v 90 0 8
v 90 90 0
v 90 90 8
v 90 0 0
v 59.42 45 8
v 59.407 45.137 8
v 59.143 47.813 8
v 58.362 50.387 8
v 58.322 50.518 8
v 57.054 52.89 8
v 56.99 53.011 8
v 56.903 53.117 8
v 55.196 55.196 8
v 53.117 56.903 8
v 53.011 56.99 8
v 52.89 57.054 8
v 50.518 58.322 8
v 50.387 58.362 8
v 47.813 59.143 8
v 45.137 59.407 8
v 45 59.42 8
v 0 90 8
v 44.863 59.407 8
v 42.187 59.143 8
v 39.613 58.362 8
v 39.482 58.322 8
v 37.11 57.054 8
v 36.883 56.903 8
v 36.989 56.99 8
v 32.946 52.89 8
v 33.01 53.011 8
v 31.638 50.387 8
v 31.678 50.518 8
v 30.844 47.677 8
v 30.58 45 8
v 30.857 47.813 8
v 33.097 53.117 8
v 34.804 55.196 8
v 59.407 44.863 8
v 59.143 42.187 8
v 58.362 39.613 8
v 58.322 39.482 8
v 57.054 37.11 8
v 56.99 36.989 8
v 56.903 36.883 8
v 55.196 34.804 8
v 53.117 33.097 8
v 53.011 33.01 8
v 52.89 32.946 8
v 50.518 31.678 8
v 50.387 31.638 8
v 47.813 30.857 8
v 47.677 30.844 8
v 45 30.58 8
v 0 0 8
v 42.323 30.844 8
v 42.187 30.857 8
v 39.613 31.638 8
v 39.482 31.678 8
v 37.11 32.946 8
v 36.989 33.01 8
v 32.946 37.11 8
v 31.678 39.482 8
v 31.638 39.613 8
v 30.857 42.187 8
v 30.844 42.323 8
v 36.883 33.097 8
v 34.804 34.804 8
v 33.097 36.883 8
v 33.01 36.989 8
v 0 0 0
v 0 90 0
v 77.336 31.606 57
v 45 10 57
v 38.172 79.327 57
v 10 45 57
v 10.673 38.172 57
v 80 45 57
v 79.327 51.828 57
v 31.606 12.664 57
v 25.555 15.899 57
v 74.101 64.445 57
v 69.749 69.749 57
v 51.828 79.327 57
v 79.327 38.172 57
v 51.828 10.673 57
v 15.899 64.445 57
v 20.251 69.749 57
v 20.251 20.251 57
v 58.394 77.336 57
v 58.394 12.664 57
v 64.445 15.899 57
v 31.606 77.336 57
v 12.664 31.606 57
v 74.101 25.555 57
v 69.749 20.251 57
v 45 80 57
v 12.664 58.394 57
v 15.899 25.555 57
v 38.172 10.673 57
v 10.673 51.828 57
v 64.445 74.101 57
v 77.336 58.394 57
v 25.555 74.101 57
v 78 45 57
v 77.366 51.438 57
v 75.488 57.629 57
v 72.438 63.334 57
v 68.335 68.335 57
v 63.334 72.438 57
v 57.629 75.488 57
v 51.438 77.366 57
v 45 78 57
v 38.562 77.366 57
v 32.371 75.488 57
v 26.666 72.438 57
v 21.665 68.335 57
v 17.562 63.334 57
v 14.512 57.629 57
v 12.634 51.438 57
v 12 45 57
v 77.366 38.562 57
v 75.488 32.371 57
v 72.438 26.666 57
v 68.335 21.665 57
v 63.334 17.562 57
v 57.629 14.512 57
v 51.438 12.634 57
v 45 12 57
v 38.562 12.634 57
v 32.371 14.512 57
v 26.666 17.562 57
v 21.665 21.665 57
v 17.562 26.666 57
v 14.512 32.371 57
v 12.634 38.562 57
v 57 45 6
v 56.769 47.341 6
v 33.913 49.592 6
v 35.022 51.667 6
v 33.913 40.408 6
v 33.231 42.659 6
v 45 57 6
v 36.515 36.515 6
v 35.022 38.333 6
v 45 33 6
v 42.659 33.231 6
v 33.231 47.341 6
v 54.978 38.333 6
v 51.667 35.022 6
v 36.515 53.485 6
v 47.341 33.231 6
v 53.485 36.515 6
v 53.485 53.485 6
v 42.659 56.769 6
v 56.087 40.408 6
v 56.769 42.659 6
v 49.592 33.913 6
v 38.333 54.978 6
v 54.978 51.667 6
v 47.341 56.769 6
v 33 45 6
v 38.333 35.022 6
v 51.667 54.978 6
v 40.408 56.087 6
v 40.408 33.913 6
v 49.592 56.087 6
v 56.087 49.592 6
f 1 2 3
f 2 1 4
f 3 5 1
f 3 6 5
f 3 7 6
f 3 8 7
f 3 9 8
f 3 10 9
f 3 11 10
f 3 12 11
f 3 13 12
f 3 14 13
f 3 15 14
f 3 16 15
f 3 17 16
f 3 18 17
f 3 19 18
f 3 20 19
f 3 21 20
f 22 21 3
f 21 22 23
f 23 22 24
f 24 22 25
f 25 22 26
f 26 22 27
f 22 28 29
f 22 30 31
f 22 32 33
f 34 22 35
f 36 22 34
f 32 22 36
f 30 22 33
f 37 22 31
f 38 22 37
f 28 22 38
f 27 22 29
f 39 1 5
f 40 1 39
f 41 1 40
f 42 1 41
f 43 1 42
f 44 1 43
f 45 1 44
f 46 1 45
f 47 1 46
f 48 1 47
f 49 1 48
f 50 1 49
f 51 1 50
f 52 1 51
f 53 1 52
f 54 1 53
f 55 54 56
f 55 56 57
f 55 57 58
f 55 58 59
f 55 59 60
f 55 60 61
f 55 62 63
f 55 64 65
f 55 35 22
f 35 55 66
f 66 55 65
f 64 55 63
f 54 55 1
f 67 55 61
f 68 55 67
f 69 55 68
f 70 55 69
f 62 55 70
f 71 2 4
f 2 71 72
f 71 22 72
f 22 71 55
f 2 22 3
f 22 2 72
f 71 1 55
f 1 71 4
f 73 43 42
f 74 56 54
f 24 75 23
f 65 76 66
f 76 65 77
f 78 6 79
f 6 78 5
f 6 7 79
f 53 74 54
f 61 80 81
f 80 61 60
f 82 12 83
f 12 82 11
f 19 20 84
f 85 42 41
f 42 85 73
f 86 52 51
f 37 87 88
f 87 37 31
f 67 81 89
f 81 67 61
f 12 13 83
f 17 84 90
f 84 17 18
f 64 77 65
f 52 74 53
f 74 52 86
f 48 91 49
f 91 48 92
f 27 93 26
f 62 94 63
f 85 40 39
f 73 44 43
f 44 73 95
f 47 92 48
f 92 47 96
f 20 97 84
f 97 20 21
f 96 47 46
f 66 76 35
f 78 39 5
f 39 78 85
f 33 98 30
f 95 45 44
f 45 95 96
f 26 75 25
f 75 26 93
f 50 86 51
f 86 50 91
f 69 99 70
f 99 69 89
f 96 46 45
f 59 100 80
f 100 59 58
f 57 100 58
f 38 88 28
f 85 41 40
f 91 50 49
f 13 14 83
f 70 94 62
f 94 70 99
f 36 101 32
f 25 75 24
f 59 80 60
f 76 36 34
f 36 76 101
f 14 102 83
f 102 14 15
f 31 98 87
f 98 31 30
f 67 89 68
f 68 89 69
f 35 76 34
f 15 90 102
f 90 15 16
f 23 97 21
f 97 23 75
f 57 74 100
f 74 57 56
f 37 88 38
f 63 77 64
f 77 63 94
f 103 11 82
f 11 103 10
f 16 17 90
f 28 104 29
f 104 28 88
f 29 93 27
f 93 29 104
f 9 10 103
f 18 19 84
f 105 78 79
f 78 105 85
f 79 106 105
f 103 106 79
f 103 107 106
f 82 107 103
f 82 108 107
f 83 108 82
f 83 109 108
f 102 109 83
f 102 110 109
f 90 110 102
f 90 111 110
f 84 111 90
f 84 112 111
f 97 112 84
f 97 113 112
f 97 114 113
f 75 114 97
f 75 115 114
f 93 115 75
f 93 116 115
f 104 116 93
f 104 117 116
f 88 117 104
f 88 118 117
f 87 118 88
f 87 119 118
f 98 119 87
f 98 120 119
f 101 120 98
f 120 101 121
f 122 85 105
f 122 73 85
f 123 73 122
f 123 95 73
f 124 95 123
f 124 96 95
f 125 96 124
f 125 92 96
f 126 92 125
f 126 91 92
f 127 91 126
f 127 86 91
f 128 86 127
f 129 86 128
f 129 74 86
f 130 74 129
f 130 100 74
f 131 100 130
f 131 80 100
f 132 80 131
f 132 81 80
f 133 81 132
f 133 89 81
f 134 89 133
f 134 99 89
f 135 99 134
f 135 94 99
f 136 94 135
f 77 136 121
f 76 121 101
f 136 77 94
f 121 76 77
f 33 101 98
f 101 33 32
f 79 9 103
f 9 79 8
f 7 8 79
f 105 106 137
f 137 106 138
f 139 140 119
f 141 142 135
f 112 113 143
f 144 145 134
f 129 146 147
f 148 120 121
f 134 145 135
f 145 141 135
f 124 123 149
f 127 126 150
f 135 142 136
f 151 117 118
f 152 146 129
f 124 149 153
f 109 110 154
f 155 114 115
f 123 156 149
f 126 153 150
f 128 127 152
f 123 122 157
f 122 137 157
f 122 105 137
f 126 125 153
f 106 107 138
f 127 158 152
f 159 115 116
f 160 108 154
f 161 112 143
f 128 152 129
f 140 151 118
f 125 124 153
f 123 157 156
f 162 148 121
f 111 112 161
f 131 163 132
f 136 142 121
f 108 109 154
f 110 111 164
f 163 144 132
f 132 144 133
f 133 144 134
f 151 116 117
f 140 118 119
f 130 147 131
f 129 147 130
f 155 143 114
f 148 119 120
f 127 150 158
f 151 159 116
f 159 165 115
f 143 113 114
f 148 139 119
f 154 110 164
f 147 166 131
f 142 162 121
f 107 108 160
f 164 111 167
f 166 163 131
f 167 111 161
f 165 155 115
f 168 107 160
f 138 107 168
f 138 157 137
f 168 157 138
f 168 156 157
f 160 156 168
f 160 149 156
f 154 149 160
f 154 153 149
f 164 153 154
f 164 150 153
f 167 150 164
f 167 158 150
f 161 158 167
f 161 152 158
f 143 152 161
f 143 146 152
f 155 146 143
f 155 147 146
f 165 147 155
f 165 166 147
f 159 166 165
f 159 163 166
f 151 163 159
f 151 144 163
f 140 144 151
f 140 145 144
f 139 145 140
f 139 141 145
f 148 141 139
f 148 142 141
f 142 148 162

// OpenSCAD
$fn = 32;

// ----------------------------------------------------------------------
// Hopper: funnel with square flange
// ----------------------------------------------------------------------

// --- parameters (mm) ---
fl = 90;                  // flange side, X and Y
fl_t = 8;                 // flange thickness
cone_h = 50;              // cone height above the flange
top_d = 70;               // cone mouth diameter
bot_d = 28;               // cone spout diameter
wall = 2;                 // cone wall thickness

bore_d = bot_d - 2 * wall;  // spout bore diameter
total_h = fl_t + cone_h - 1;  // overall height

difference() {
  union() {
    cube([fl, fl, fl_t]);
    translate([fl / 2, fl / 2, fl_t - 1])
      cylinder(h = cone_h, d1 = bot_d, d2 = top_d);
  }
  translate([fl / 2, fl / 2, fl_t - 2])
    cylinder(h = cone_h + 1, d1 = bore_d, d2 = top_d - 2 * wall);
}
